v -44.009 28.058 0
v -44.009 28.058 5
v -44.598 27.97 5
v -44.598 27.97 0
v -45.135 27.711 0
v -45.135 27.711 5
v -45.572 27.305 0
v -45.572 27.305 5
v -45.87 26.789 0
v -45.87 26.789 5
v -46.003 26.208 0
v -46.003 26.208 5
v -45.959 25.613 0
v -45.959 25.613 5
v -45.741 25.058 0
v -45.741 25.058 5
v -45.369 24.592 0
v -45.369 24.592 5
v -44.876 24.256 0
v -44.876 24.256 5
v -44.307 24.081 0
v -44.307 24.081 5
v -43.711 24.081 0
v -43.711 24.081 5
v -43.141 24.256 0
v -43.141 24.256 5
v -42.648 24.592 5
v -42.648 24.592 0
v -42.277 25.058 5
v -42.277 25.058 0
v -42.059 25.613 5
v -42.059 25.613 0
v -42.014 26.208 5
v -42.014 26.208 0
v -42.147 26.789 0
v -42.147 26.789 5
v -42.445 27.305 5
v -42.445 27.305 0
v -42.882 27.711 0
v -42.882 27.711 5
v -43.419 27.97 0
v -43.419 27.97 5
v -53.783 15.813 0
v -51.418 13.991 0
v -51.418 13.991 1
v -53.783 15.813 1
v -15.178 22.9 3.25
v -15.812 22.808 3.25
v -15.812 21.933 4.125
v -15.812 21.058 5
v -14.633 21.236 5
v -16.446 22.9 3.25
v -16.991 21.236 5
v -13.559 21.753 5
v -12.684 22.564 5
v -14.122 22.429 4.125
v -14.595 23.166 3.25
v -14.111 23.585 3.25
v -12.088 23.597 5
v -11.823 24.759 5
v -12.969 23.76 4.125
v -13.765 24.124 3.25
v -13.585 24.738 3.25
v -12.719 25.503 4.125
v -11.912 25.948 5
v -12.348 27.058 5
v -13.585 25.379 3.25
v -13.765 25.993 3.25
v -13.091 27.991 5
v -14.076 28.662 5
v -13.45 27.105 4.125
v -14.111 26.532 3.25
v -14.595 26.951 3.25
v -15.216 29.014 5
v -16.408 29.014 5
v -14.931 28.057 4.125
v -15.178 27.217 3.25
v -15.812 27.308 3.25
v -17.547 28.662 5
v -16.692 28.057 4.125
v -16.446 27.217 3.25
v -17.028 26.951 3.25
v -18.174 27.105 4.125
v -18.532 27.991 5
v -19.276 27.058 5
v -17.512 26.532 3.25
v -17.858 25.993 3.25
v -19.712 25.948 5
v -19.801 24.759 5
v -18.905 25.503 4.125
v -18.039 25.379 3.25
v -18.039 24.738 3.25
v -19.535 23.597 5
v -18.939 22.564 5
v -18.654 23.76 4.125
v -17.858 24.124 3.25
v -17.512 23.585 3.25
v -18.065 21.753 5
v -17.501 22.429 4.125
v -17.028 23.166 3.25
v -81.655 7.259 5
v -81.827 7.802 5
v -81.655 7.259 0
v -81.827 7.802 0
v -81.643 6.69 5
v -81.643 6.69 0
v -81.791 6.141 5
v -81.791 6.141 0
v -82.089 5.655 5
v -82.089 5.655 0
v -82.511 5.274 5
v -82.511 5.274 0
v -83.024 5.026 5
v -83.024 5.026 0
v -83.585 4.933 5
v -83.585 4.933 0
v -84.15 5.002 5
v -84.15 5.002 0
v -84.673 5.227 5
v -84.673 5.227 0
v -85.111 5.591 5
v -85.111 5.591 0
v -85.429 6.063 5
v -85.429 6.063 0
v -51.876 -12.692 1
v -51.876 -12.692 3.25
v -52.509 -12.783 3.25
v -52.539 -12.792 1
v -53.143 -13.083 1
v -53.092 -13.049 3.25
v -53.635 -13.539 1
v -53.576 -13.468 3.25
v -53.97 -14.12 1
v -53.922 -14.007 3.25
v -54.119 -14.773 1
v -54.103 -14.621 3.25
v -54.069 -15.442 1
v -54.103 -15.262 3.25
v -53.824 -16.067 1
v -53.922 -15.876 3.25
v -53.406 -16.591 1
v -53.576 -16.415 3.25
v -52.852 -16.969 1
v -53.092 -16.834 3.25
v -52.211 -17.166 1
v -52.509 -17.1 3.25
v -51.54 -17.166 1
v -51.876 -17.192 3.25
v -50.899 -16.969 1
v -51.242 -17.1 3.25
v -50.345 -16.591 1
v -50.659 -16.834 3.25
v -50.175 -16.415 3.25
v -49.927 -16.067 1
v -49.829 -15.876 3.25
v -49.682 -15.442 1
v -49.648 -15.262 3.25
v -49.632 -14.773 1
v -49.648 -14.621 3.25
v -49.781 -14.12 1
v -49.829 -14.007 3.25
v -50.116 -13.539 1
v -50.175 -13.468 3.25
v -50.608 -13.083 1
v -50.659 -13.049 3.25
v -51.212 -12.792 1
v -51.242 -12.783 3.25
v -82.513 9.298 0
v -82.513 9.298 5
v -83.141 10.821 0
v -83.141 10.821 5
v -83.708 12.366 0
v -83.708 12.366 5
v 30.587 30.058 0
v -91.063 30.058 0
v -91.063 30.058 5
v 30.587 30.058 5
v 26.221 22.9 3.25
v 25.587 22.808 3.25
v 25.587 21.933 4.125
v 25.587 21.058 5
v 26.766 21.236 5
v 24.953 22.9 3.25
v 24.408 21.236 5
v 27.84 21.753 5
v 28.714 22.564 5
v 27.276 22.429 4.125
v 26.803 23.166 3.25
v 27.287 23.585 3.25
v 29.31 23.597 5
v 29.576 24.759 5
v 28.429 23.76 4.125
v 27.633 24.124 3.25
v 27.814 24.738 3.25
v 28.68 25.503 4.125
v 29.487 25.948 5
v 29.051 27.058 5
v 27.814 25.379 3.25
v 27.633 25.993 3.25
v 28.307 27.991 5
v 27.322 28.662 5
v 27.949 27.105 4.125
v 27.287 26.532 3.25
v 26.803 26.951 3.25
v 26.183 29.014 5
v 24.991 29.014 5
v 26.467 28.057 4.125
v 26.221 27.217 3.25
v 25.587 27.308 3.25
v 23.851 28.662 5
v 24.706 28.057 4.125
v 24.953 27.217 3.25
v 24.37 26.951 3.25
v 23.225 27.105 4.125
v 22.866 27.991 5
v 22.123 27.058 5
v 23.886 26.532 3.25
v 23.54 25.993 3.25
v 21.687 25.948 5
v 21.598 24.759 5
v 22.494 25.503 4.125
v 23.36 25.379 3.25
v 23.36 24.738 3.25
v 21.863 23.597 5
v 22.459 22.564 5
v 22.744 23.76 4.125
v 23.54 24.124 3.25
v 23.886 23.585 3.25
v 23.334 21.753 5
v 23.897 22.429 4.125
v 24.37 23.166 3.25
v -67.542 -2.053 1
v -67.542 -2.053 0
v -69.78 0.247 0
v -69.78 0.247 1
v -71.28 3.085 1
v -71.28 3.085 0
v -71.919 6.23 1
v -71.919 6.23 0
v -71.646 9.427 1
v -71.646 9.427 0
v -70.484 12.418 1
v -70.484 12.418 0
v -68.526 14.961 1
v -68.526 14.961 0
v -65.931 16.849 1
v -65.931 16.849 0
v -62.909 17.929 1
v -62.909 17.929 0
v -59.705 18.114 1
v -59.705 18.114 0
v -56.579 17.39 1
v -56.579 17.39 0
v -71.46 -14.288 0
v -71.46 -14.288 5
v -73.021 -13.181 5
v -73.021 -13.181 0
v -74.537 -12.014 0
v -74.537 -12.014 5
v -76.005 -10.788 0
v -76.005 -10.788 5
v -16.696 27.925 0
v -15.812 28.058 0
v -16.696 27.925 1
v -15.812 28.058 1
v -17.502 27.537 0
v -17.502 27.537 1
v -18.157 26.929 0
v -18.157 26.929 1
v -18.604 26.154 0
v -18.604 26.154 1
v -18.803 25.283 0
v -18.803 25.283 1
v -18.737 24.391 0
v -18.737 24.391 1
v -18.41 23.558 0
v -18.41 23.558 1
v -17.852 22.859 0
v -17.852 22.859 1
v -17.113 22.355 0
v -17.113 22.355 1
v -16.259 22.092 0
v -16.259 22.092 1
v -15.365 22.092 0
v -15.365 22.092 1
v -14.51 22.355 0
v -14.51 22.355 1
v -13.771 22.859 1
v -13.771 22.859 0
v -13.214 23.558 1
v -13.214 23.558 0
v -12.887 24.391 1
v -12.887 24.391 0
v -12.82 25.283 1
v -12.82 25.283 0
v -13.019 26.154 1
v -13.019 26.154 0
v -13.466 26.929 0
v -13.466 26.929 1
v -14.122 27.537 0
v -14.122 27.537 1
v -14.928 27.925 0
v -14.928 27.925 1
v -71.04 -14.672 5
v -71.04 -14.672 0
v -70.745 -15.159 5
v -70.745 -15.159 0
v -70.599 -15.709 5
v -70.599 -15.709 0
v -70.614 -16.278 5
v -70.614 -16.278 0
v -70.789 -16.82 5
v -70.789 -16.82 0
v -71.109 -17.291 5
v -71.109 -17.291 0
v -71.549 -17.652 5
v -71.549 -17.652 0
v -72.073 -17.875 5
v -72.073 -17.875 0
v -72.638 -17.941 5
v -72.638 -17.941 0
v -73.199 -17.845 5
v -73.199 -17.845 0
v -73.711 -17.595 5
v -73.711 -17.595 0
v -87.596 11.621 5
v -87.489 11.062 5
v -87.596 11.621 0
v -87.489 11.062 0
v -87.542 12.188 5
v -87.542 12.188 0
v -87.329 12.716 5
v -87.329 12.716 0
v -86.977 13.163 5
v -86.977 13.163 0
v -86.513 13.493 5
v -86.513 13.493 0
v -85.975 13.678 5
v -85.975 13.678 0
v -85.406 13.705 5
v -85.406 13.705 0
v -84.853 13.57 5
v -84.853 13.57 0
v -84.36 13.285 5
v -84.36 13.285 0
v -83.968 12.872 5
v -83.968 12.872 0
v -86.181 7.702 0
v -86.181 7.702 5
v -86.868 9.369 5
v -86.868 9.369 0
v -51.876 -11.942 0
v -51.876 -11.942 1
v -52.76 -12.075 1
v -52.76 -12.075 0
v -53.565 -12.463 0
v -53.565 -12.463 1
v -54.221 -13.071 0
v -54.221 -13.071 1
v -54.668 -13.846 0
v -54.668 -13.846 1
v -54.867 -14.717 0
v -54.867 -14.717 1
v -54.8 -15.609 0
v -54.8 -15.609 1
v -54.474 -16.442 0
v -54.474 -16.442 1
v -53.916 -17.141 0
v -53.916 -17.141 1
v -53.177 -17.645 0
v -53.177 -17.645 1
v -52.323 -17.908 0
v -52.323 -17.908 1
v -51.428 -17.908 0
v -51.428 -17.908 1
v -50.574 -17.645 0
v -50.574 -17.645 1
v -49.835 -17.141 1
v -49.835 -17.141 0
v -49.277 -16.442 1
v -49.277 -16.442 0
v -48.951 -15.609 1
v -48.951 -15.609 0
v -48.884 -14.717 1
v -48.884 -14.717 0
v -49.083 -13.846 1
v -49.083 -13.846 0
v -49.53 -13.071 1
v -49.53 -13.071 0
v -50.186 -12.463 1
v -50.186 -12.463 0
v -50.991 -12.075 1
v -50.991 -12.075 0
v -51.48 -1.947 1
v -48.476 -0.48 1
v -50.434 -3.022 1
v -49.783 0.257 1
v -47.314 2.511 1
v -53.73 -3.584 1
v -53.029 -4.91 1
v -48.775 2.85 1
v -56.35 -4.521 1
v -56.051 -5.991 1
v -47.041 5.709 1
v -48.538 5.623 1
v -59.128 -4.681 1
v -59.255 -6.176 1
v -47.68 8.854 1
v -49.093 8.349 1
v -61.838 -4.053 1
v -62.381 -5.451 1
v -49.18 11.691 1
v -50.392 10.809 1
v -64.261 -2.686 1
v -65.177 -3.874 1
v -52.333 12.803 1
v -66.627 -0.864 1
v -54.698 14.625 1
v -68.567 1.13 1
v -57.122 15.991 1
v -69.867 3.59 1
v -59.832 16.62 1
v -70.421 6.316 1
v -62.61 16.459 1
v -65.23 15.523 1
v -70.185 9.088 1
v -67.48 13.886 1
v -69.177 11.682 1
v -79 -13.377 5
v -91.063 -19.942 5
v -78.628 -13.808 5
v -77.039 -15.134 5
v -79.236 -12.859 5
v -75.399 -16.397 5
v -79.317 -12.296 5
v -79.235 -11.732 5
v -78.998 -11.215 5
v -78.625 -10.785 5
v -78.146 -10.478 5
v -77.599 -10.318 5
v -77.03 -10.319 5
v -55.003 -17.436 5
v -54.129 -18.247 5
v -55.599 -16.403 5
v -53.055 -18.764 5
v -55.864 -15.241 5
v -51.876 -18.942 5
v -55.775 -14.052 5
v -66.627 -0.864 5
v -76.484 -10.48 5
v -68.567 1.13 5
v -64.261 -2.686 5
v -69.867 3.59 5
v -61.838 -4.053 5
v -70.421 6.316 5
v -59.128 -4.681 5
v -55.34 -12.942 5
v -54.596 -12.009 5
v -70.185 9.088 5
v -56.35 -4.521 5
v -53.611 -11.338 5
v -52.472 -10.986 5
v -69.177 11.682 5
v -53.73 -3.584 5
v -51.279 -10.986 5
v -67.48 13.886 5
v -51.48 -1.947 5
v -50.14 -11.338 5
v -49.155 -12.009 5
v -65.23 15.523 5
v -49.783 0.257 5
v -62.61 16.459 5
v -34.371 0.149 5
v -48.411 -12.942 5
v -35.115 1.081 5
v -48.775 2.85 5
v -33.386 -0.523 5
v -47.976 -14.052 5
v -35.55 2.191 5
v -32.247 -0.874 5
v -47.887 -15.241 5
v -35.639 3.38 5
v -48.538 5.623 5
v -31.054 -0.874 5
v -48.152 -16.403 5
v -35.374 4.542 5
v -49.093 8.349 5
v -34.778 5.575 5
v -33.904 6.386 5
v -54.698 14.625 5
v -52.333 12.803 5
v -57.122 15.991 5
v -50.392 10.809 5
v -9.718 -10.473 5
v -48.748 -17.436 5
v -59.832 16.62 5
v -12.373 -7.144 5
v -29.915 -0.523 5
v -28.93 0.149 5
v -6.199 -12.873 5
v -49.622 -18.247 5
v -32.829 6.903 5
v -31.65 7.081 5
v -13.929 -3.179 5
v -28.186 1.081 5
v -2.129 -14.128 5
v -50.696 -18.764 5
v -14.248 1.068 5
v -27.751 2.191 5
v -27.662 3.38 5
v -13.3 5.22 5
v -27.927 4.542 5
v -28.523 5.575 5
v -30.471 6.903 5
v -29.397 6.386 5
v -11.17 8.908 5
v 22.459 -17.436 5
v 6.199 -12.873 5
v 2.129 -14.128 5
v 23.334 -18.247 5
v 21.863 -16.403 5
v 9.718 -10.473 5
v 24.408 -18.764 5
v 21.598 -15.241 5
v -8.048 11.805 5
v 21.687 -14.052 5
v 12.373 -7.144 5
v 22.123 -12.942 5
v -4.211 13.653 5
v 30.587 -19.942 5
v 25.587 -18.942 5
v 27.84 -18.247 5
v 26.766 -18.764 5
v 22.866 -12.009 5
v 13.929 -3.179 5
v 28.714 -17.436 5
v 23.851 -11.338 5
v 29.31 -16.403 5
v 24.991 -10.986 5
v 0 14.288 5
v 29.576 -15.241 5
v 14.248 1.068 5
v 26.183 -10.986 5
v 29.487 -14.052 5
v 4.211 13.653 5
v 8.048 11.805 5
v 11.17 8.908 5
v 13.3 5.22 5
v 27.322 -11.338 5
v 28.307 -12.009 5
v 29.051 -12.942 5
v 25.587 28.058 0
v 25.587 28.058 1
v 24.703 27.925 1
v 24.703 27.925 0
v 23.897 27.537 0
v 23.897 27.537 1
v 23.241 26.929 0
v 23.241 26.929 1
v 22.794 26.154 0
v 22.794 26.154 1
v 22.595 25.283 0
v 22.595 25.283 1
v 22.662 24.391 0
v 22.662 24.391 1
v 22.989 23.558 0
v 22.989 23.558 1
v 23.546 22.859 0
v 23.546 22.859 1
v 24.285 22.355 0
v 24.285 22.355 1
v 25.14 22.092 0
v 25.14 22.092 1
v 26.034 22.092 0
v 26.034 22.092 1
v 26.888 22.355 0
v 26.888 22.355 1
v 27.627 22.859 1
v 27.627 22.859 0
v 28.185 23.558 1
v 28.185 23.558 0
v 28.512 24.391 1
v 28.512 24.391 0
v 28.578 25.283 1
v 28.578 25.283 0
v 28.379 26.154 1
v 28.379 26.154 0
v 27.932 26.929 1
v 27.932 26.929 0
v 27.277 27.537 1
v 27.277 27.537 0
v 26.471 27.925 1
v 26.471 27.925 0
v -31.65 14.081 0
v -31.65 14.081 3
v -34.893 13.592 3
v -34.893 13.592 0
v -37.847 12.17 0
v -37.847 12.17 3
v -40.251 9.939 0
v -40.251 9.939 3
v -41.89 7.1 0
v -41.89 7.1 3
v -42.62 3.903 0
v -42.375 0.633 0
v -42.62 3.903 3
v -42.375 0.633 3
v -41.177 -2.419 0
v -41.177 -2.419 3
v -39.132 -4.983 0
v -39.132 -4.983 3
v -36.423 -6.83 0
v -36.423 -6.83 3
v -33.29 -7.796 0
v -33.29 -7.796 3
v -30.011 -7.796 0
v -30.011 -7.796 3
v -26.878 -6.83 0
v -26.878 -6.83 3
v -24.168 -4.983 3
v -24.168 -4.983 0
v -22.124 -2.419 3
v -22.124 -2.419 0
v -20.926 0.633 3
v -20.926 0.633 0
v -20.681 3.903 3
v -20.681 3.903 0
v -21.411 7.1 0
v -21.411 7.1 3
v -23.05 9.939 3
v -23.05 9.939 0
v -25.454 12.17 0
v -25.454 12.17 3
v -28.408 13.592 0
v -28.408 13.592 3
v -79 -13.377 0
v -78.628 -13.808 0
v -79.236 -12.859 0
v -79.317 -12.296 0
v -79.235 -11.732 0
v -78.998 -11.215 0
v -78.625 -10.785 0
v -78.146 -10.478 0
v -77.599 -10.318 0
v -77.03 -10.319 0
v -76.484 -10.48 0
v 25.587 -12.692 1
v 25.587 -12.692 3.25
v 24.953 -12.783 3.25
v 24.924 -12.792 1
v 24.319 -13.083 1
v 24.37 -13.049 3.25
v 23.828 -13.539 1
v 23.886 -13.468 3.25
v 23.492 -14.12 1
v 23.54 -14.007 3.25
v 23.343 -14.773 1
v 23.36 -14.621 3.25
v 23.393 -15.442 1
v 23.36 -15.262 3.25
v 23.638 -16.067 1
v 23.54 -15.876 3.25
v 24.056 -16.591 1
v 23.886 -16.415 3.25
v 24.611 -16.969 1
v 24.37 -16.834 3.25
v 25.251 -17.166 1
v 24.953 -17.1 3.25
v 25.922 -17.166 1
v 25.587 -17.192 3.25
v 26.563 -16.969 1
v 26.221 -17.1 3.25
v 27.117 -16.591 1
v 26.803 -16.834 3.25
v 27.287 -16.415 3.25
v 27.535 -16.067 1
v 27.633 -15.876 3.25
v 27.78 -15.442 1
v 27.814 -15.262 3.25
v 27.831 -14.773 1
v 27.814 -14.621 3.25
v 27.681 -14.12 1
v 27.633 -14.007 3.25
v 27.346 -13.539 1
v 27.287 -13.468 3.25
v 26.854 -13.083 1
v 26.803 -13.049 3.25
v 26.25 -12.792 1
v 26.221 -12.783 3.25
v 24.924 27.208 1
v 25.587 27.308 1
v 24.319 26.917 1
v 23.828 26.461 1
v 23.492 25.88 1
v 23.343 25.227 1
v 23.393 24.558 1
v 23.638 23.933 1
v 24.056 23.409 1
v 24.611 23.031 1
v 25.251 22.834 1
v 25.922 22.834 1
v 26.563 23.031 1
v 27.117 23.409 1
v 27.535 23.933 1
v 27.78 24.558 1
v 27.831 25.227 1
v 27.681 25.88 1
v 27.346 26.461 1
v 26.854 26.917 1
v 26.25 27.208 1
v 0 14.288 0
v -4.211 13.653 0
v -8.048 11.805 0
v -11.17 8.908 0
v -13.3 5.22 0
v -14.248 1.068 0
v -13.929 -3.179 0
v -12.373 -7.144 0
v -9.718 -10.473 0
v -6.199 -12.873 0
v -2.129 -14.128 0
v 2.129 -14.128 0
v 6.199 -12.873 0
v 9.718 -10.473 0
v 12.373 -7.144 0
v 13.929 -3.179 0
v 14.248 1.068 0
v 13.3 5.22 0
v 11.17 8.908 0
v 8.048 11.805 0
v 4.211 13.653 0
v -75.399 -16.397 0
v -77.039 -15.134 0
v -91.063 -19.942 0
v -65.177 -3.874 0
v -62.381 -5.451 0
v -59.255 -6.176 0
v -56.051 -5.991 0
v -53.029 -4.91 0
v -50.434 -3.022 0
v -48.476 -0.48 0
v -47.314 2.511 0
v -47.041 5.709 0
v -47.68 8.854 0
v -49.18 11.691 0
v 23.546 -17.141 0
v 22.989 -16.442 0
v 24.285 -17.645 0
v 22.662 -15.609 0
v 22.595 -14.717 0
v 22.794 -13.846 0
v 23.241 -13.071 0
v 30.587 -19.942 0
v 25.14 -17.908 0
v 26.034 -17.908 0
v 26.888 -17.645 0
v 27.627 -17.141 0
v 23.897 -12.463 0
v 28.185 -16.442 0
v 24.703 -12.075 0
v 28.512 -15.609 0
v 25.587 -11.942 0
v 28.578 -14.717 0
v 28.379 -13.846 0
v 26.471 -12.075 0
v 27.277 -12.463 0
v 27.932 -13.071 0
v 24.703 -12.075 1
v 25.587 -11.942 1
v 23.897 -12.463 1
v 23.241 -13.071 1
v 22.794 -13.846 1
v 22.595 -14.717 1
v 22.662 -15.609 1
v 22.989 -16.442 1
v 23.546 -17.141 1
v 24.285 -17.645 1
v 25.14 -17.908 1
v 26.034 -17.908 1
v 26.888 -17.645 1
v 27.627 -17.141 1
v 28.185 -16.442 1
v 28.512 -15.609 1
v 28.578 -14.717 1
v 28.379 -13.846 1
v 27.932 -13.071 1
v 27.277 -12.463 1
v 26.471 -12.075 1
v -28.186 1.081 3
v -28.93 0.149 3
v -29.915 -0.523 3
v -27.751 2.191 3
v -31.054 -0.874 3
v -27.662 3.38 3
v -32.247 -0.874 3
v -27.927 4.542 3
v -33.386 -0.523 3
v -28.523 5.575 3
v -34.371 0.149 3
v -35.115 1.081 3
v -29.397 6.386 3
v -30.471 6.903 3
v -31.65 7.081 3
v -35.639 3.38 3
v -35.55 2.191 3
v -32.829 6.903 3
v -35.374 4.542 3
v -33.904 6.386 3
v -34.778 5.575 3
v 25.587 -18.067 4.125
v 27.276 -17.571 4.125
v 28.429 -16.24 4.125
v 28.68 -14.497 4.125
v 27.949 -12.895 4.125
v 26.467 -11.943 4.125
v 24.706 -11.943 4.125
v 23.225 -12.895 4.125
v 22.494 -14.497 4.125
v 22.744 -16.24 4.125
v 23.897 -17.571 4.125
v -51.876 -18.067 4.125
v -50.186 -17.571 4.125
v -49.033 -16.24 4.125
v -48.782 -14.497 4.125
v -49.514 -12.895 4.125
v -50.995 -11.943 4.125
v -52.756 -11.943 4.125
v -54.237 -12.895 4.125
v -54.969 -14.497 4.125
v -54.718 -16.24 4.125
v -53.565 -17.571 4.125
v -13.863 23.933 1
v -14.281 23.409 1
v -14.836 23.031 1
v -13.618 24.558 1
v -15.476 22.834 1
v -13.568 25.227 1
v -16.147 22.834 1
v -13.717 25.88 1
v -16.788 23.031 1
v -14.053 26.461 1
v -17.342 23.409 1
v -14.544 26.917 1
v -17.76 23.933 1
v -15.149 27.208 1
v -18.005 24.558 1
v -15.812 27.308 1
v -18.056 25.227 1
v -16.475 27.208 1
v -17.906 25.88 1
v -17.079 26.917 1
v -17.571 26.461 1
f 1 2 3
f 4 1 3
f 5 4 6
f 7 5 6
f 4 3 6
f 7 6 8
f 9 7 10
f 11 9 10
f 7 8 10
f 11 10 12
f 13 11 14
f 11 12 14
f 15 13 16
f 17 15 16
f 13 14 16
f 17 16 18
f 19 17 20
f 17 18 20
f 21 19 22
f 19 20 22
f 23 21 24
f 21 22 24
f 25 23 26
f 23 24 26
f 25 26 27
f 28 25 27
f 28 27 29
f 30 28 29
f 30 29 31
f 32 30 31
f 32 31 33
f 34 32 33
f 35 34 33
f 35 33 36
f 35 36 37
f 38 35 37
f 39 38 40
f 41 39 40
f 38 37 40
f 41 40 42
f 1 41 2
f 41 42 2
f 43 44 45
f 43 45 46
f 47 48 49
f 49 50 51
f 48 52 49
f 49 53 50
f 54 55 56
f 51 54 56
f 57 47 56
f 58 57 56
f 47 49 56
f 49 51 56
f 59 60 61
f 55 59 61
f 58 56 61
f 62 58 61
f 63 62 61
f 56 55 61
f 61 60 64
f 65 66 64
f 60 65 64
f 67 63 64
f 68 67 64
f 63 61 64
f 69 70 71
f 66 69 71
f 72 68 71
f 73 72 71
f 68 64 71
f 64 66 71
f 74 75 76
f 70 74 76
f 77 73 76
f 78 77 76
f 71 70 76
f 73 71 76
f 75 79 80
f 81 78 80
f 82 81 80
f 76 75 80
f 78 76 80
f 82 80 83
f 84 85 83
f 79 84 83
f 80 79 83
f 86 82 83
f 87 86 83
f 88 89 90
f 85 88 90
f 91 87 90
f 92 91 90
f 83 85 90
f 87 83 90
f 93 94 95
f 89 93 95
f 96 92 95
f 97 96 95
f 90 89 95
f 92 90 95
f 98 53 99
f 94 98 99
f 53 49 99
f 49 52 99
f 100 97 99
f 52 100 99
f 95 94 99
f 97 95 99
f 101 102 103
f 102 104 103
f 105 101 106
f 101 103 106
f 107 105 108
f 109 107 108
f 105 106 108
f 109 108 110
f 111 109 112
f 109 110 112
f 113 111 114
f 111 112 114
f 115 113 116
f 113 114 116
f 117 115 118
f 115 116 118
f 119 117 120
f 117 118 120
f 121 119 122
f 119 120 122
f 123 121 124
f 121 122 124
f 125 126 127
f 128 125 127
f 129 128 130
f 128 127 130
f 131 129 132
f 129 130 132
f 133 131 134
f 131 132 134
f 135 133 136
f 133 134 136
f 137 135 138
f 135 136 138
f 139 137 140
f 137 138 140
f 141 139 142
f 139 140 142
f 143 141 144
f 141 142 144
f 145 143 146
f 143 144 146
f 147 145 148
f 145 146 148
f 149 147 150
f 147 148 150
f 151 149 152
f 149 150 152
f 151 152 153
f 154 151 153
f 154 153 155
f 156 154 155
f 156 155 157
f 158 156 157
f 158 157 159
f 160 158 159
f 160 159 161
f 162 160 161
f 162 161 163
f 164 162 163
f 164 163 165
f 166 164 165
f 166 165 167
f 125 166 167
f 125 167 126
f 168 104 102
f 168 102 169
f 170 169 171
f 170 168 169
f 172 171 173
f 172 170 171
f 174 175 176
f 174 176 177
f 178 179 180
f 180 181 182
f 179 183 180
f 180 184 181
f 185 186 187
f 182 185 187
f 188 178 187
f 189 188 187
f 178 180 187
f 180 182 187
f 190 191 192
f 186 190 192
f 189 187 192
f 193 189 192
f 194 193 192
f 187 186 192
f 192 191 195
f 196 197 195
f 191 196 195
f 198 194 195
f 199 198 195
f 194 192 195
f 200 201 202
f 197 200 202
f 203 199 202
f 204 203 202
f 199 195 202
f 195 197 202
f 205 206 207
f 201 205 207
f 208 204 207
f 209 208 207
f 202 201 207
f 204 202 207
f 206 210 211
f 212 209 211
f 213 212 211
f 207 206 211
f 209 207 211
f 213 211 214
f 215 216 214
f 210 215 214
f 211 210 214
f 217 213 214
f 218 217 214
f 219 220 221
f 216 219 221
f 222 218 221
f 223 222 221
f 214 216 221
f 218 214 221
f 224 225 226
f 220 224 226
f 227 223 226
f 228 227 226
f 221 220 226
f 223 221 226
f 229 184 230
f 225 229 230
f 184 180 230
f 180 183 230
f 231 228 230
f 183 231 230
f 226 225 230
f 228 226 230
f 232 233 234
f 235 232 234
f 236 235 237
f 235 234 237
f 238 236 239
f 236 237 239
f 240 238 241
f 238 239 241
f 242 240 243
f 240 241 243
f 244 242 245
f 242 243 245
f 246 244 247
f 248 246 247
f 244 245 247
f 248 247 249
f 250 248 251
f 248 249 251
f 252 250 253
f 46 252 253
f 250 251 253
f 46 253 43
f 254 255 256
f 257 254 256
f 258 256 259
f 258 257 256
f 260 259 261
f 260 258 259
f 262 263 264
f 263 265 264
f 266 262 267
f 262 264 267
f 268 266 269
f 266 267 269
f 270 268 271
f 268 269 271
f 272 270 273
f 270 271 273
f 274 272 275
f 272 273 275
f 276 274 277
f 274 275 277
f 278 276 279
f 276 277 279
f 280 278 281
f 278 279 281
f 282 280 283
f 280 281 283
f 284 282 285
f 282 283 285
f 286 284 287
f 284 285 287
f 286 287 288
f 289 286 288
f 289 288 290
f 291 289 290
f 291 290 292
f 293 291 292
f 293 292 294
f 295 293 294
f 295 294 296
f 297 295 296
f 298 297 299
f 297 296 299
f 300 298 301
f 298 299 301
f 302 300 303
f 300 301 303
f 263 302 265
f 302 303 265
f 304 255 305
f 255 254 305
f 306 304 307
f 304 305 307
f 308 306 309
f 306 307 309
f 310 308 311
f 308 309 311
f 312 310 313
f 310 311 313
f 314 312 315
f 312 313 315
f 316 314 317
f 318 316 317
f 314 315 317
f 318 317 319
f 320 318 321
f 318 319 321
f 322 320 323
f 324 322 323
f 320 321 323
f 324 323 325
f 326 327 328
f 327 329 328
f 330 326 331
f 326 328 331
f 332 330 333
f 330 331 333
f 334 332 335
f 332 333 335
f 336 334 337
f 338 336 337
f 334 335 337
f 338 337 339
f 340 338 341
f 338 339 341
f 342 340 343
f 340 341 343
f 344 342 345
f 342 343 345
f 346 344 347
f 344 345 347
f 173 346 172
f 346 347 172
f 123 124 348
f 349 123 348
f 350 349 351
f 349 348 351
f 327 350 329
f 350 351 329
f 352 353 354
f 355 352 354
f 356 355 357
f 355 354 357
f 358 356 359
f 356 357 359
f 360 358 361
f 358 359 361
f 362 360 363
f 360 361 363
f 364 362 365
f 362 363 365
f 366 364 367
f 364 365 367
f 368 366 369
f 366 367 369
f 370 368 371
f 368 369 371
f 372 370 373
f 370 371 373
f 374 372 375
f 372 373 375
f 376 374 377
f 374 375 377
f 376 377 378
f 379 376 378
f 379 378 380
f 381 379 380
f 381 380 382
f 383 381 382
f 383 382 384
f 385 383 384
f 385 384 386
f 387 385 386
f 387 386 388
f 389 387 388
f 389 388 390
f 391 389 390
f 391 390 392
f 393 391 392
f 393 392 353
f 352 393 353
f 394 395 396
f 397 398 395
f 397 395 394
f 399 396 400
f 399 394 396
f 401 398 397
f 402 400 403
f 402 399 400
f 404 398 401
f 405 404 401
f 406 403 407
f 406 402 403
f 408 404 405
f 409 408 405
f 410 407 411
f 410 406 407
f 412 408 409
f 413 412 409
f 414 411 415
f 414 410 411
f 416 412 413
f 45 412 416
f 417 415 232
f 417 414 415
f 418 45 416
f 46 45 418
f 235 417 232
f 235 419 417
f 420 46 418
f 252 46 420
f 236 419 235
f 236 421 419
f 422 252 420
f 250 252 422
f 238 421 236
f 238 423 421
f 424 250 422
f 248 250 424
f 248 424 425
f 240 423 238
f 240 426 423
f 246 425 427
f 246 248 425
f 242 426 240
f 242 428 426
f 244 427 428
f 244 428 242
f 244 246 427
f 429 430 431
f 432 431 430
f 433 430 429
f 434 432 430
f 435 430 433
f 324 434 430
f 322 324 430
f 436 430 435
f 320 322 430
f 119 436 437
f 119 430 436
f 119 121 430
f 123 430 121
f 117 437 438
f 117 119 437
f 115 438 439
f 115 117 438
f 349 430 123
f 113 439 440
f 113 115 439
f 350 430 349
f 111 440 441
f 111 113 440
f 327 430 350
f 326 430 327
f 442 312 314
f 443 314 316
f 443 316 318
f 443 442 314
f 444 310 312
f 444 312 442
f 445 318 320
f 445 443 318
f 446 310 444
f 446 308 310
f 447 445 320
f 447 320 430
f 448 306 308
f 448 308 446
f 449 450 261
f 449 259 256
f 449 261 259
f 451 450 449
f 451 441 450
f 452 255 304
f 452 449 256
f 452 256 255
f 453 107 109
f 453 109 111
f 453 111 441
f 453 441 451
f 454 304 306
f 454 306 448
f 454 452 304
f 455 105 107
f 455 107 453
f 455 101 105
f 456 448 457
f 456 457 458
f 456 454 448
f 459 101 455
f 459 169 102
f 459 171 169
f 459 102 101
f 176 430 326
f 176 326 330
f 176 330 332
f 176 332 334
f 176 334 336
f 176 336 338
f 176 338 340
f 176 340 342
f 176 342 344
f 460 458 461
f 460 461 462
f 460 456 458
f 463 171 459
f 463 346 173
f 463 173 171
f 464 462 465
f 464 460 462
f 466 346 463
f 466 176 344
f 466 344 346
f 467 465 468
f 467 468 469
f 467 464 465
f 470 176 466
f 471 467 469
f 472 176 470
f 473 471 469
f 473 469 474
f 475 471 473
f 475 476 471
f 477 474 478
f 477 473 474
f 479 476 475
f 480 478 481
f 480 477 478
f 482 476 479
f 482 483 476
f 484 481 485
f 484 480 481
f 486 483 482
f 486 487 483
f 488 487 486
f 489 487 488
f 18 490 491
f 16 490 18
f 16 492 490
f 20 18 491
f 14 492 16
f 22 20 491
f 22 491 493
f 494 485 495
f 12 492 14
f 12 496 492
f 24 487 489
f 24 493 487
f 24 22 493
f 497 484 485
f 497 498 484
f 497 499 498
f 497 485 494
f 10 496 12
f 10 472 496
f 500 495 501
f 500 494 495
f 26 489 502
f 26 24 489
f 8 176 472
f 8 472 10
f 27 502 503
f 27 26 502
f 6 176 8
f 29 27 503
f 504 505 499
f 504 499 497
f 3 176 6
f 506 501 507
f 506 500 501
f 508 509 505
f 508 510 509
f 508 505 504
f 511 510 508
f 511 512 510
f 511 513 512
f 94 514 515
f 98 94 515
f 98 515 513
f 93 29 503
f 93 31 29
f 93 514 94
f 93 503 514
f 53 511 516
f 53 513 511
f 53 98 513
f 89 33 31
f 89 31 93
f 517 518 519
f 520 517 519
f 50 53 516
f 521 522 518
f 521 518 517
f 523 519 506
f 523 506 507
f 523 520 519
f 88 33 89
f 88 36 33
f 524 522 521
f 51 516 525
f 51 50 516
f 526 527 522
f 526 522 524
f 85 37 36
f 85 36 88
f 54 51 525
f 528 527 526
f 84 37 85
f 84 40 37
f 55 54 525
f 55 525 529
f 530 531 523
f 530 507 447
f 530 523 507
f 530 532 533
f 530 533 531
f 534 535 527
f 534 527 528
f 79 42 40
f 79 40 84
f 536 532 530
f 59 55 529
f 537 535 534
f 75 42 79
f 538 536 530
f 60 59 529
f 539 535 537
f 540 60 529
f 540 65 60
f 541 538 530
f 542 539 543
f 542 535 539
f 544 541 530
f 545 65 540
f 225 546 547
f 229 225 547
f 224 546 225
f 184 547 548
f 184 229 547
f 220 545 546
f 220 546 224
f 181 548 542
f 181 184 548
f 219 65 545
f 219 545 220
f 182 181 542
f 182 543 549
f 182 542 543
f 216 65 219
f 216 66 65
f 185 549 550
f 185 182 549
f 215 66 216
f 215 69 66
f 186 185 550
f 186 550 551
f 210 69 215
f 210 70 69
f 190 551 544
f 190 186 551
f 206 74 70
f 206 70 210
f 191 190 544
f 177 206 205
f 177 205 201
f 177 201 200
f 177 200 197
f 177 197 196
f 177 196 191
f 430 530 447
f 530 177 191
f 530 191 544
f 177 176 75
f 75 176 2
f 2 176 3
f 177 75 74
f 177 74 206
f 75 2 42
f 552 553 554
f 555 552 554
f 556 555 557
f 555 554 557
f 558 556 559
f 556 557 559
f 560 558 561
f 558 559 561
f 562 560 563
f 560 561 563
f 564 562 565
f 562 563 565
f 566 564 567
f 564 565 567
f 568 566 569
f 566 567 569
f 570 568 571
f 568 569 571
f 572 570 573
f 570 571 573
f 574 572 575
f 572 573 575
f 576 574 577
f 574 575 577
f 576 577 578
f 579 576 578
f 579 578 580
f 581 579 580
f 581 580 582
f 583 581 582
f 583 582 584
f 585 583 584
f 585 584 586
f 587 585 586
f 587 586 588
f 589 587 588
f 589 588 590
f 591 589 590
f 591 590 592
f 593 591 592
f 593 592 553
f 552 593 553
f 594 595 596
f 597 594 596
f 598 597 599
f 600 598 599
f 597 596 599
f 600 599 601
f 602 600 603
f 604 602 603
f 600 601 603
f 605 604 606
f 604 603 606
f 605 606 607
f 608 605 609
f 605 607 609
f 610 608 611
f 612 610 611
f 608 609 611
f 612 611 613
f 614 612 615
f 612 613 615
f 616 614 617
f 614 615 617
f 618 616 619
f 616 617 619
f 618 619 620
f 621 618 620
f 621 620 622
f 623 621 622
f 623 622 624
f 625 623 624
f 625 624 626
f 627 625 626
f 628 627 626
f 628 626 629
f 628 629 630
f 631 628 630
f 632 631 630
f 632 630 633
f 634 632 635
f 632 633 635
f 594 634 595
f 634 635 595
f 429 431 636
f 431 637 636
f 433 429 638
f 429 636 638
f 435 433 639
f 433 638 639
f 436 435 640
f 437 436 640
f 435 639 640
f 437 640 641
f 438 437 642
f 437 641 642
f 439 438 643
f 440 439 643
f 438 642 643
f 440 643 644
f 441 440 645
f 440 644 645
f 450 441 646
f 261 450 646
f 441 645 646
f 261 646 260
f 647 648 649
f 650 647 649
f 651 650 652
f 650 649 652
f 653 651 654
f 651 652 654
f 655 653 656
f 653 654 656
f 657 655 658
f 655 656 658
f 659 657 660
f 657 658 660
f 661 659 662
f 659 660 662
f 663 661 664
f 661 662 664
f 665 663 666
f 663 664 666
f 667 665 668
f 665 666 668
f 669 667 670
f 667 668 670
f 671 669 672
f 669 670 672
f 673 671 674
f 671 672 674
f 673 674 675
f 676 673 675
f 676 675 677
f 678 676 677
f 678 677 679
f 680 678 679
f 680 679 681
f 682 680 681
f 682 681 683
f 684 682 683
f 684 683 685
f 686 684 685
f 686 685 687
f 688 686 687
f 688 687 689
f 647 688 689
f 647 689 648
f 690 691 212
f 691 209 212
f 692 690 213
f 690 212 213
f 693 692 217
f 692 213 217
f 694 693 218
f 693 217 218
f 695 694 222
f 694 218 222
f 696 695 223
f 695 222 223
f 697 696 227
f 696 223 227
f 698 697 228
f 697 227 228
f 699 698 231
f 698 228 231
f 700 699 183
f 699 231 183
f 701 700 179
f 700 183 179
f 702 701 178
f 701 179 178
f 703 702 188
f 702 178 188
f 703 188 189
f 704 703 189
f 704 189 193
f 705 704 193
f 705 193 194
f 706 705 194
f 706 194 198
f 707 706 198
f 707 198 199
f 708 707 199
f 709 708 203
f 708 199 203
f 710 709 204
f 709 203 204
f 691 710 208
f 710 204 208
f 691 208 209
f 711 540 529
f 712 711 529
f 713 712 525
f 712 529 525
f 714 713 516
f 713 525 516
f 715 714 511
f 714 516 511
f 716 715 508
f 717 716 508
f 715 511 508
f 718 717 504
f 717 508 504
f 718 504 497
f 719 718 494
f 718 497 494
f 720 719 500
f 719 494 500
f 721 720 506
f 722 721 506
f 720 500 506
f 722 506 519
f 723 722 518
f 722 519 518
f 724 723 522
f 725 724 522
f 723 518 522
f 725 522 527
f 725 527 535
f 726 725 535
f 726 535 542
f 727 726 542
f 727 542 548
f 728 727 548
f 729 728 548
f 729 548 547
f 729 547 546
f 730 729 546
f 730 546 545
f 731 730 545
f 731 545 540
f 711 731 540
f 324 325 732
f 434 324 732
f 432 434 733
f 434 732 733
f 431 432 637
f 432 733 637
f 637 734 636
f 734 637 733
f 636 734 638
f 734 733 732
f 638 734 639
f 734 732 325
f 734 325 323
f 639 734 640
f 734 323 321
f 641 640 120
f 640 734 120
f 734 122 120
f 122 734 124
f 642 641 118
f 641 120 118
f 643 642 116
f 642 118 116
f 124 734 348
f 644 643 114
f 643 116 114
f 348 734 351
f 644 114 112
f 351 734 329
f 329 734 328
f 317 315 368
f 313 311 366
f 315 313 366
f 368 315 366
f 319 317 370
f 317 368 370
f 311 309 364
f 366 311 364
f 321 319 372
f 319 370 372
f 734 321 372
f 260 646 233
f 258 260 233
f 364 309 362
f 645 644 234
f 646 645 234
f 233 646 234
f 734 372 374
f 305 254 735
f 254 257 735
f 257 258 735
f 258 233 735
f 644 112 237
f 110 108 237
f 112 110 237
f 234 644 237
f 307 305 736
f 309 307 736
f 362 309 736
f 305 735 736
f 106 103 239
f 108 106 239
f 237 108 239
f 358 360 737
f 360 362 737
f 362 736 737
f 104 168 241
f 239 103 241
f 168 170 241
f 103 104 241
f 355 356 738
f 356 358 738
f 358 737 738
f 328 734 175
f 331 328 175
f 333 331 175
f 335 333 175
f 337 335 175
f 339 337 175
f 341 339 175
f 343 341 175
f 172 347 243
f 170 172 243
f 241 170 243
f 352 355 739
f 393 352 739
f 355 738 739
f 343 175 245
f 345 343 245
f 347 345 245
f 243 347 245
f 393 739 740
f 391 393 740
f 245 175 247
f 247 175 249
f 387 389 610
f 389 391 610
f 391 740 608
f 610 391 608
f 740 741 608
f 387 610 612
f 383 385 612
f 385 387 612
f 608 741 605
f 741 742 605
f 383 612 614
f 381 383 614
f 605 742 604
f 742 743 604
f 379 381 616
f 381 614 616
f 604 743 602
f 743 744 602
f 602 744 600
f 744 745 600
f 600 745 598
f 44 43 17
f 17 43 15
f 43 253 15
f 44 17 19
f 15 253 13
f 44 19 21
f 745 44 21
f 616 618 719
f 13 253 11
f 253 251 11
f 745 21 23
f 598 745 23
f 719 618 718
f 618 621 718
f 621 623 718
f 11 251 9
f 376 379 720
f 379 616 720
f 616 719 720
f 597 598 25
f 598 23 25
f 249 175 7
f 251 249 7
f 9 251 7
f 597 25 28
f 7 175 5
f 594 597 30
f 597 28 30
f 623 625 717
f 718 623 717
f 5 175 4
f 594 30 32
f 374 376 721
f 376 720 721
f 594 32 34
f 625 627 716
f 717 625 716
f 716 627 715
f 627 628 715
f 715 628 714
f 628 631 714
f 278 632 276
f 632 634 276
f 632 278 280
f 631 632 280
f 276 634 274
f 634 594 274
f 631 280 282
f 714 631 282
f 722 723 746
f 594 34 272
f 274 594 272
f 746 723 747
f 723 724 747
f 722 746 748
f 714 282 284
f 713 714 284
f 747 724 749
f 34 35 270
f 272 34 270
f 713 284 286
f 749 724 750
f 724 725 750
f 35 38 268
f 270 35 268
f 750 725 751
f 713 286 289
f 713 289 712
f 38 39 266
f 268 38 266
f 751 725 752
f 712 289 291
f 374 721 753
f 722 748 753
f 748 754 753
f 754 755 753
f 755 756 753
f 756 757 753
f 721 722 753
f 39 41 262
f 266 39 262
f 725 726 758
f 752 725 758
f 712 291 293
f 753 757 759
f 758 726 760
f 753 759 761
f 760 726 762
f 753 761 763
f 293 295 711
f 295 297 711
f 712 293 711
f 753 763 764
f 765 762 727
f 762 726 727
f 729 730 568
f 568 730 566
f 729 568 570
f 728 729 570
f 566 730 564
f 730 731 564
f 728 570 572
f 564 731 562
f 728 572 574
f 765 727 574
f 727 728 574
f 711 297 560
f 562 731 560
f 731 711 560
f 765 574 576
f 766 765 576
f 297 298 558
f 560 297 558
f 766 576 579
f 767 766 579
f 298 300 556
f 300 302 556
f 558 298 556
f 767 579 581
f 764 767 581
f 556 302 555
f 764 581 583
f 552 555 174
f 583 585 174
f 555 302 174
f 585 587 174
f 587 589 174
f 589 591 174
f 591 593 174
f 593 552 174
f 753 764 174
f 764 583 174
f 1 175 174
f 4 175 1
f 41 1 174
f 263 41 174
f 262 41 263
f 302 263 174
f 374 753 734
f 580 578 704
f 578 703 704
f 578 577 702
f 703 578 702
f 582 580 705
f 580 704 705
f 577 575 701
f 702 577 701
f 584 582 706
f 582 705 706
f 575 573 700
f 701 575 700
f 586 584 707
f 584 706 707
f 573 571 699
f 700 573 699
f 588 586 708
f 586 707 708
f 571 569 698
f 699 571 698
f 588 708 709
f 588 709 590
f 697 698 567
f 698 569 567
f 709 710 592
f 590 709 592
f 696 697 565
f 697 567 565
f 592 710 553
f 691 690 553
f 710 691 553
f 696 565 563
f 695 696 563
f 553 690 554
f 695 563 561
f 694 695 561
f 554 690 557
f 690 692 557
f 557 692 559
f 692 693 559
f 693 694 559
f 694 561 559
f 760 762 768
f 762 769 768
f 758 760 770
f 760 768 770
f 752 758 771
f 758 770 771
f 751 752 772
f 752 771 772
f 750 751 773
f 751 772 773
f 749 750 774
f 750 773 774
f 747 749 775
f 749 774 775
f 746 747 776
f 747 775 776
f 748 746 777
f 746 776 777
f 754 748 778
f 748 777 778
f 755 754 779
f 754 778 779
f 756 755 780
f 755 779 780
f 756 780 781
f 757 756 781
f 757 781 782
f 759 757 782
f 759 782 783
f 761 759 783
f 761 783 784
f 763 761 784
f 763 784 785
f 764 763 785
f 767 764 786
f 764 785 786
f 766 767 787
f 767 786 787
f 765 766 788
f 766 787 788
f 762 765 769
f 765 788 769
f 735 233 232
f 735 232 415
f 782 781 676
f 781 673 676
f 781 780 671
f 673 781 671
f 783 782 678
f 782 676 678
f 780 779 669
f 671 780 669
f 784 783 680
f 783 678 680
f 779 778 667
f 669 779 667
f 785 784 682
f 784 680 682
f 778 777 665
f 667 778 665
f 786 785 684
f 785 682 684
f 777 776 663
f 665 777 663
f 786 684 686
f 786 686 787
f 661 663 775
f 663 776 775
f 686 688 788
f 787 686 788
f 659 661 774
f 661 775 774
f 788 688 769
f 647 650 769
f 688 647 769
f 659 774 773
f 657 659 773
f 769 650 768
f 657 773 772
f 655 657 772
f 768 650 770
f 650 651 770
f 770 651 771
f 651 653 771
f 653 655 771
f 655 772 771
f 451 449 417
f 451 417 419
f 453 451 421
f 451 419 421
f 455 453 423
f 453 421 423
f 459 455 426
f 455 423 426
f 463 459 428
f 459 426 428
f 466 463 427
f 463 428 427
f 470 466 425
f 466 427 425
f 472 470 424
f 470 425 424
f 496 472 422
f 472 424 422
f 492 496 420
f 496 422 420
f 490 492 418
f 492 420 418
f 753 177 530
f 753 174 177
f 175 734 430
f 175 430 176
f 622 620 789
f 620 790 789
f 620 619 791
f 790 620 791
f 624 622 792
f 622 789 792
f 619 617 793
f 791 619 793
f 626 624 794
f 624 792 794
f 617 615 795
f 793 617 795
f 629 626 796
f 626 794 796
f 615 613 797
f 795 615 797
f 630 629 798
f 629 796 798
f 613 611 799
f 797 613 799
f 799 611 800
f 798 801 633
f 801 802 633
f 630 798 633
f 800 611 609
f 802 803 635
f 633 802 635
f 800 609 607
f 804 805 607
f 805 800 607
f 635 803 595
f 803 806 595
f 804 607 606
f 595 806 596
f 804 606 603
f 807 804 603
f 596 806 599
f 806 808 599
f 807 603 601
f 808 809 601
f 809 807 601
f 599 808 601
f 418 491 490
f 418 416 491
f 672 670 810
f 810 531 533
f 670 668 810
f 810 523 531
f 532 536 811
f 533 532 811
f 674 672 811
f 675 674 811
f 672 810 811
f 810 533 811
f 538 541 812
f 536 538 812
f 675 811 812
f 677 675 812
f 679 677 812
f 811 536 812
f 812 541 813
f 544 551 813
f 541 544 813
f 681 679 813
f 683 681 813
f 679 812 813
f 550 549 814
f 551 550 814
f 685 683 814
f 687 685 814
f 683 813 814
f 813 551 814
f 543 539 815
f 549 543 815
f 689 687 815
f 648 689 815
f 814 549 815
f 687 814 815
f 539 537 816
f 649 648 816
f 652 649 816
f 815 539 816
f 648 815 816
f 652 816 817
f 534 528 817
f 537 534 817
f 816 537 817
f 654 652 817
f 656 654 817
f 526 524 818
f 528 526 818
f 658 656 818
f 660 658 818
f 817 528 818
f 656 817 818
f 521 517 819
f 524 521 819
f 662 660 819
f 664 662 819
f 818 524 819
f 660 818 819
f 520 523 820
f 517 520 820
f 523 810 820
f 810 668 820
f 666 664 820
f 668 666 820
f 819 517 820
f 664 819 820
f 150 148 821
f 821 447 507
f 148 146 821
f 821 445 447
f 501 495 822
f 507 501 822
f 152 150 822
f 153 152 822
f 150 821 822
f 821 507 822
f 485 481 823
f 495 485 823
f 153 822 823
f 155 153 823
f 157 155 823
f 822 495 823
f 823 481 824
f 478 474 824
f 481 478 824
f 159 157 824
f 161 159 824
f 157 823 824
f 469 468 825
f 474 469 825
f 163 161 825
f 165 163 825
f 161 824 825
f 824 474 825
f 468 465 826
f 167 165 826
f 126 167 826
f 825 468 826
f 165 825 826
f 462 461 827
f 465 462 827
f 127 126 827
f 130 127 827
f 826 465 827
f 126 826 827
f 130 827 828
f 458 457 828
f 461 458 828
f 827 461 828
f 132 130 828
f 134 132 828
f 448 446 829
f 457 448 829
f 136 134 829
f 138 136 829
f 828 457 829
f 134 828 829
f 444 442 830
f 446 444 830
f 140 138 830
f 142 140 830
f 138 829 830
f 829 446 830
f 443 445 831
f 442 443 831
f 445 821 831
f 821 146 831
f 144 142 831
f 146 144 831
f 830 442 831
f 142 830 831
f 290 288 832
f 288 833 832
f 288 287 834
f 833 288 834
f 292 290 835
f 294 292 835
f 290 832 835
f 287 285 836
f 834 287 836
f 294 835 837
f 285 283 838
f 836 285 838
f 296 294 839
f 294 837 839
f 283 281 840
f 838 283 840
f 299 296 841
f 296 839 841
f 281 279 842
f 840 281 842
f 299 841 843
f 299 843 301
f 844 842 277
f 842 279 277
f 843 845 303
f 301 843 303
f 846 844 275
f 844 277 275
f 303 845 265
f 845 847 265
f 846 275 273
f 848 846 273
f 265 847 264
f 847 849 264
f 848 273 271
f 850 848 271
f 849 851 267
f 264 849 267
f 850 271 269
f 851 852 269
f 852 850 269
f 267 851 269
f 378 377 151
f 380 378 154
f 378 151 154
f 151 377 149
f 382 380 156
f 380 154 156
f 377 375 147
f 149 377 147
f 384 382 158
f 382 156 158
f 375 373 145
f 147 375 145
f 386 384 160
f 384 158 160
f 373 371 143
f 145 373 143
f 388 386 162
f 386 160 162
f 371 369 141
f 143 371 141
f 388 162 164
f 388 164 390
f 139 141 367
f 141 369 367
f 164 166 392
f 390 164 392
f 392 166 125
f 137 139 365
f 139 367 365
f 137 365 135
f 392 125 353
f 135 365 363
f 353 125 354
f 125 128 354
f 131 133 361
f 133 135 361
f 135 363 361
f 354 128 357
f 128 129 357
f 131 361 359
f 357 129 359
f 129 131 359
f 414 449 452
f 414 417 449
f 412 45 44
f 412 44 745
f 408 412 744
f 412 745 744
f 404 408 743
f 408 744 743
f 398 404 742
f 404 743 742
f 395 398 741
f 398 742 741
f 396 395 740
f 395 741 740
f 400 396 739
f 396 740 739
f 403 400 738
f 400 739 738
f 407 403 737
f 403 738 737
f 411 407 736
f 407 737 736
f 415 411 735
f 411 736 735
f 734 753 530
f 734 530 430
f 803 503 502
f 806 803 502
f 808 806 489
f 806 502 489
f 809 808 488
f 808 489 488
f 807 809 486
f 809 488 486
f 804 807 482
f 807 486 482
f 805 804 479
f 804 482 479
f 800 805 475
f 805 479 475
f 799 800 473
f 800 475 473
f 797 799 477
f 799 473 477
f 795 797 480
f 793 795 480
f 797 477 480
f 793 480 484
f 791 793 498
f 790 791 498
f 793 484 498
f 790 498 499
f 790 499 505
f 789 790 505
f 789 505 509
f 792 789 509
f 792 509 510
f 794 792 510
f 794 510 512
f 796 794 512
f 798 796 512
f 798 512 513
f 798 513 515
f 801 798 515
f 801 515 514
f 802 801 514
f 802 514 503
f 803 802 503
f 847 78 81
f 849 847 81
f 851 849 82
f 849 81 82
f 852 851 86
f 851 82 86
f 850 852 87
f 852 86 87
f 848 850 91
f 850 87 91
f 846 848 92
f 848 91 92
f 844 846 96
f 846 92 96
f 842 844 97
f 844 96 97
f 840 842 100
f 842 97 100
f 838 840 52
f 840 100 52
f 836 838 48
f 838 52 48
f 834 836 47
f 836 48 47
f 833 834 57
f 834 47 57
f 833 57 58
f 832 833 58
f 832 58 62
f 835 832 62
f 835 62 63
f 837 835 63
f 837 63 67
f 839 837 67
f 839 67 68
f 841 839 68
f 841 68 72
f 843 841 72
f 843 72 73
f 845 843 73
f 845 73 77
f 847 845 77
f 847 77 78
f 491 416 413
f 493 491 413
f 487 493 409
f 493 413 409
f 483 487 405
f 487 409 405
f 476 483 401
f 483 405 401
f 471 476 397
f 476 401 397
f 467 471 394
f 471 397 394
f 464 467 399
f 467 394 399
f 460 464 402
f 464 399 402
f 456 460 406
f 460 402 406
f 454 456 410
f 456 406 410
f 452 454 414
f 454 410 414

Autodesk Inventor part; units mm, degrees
ref_plane "YZ Plane" through (0, 0, 0) normal (1, 0, 0) x (0, 1, 0)
ref_plane "XZ Plane" through (0, 0, 0) normal (0, 1, 0) x (-1, 0, 0)
ref_plane "XY Plane" through (0, 0, 0) normal (0, 0, 1) x (1, 0, 0)
sketch "MASTER SKETCH" plane through (0, 0, 0) normal (0, 0, 1) x (1, 0, 0)
  circle A0 centre (0, 0) radius 22.86
  circle A1 centre (-31.6504, 3.081) radius 8.89
  circle A2 centre (-31.6504, 3.081) radius 20.32
  circle A3 centre (-60.6627, 6.8802) radius 8.89
  circle A4 centre (-58.2971, 5.0584) radius 6.35
  circle A5 centre (-60.6627, 6.8802) radius 25.4
  circle A6 centre (-58.2971, 5.0584) radius 25.4 construction
  line L0 (-44.0087, 26.0584) -> (-77.3167, -12.298) construction
  line L1 (-68.9445, 30.8921) -> (-52.3809, -17.1317) construction
  circle A7 centre (-44.0087, 26.0584) radius 2
  arc A8 (-68.9445, 30.8921) -> (-69.3394, 27.9326) centre (-44.0087, 26.0584) ccw construction
  arc A9 (-70.9079, 31.2727) -> (-71.334, 28.0802) centre (-44.0087, 26.0584) ccw
  arc A10 (-66.981, 30.5115) -> (-67.3449, 27.785) centre (-44.0087, 26.0584) ccw
  arc A11 (-66.981, 30.5115) -> (-70.9079, 31.2727) centre (-68.9445, 30.8921) ccw
  arc A12 (-71.334, 28.0802) -> (-67.3449, 27.785) centre (-69.3394, 27.9326) ccw
  arc A13 (-85.5985, 11.7139) -> (-83.6279, 6.9326) centre (-44.0087, 26.0584) ccw construction
  arc A14 (-87.4892, 11.0618) -> (-85.429, 6.0631) centre (-44.0087, 26.0584) ccw
  arc A15 (-83.7078, 12.366) -> (-81.8268, 7.8021) centre (-44.0087, 26.0584) ccw
  arc A16 (-83.7078, 12.366) -> (-87.4892, 11.0618) centre (-85.5985, 11.7139) ccw
  arc A17 (-85.429, 6.0631) -> (-81.8268, 7.8021) centre (-83.6279, 6.9326) ccw
  arc A18 (-77.3167, -12.298) -> (-72.5856, -15.9416) centre (-44.0087, 26.0584) ccw construction
  arc A19 (-78.6281, -13.8081) -> (-73.7107, -17.5951) centre (-44.0087, 26.0584) ccw
  arc A20 (-76.0054, -10.7879) -> (-71.4605, -14.288) centre (-44.0087, 26.0584) ccw
  arc A21 (-76.0054, -10.7879) -> (-78.6281, -13.8081) centre (-77.3167, -12.298) ccw
  arc A22 (-73.7107, -17.5951) -> (-71.4605, -14.288) centre (-72.5856, -15.9416) ccw
  arc A23 (-52.3809, -17.1317) -> (-47.2548, -17.8157) centre (-44.0087, 26.0584) ccw construction
  arc A24 (-52.7615, -19.0951) -> (-47.4024, -19.8103) centre (-44.0087, 26.0584) ccw
  arc A25 (-52.0003, -15.1682) -> (-47.1072, -15.8212) centre (-44.0087, 26.0584) ccw
  arc A26 (-52.0003, -15.1682) -> (-52.7615, -19.0951) centre (-52.3809, -17.1317) ccw
  arc A27 (-47.4024, -19.8103) -> (-47.1072, -15.8212) centre (-47.2548, -17.8157) ccw
  arc A28 (-35.7269, 2.0465) -> (-32.9664, 3.1843) centre (-44.0087, 26.0584) ccw construction
  arc A29 (-35.0748, 0.1558) -> (-32.0969, 1.3831) centre (-44.0087, 26.0584) ccw
  arc A30 (-36.379, 3.9372) -> (-33.8358, 4.9854) centre (-44.0087, 26.0584) ccw
  arc A31 (-36.379, 3.9372) -> (-35.0748, 0.1558) centre (-35.7269, 2.0465) ccw
  arc A32 (-32.0969, 1.3831) -> (-33.8358, 4.9854) centre (-32.9664, 3.1843) ccw
  line L2 (-91.0627, 30.0584) -> (30.5868, 30.0584)
  line L3 (30.5868, 30.0584) -> (30.5868, -19.9416)
  line L4 (30.5868, -19.9416) -> (-91.0627, -19.9416)
  line L5 (-91.0627, -19.9416) -> (-91.0627, 30.0584)
  circle A33 centre (0, 0) radius 14.2875 construction
  circle A34 centre (25.5868, -14.9416) radius 3
  circle A35 centre (25.5868, 25.0584) radius 3
  circle A36 centre (-51.8755, -14.9416) radius 3
  line L6 (-91.0627, 25.3566) -> (30.5868, 25.3566) construction
  circle A37 centre (-15.8118, 25.0584) radius 3
  line L7 (-58.2971, 5.0584) -> (-60.6627, 6.8802) construction
  line L8 (-52.3328, 12.803) -> (-54.6984, 14.6248)
  line L9 (-66.627, -0.8643) -> (-64.2614, -2.6861)
  arc A38 (-64.2614, -2.6861) -> (-52.3328, 12.803) centre (-58.2971, 5.0584) ccw
  arc A39 (-54.6984, 14.6248) -> (-66.627, -0.8643) centre (-60.6627, 6.8802) ccw
  circle A40 centre (0, 0) radius 24.13 construction
  circle A41 centre (-31.6504, 3.081) radius 21.59 construction
  line L10 (-67.5422, -2.0527) -> (-65.1767, -3.8745)
  arc A42 (-65.1767, -3.8745) -> (-51.4176, 13.9914) centre (-58.2971, 5.0584) ccw
  line L11 (-51.4176, 13.9914) -> (-53.7832, 15.8132)
  arc A43 (-53.7832, 15.8132) -> (-67.5422, -2.0527) centre (-60.6627, 6.8802) ccw
  circle A44 centre (-44.0087, 26.0584) radius 50.8 construction
  arc A45 (-67.3815, -0.857) -> (-64.0616, -3.4137) centre (-44.0087, 26.0584) ccw
  arc A46 (-53.9439, 14.6174) -> (-52.5326, 13.5306) centre (-44.0087, 26.0584) ccw
  arc A47 (-53.9439, 14.6174) -> (-67.3815, -0.857) centre (-60.6627, 6.8802) ccw
  arc A48 (-64.0616, -3.4137) -> (-52.5326, 13.5306) centre (-58.2971, 5.0584) ccw
  line L12 (-35.7269, 2.0465) -> (-85.5985, 11.7139) construction
  point P0 (-60.0285, -7.7006)
  point P1 (-59.4799, 5.9693)
  dimension "d0" = 45.72
  dimension "d1" = 17.78
  dimension "d2" = 40.64
  dimension "d4" = 17.78
  dimension "d5" = 12.7
  dimension "d6" = 50.8
  dimension "d9" = 50.8
  dimension "d10" = 60
  dimension "d12" = 4
  dimension "d13" = 4
  dimension "d14" = 4
  dimension "d15" = 4
  dimension "d16" = 4
  dimension "d17" = 4
  dimension "d19" = 28.575
  dimension "d28" = 6
  dimension "d29" = 6
  dimension "d30" = 6
  dimension "d39" = 31.8
  dimension "d42" = 29.26
  dimension "d43" = 26.72
  dimension "d70" = 2
  dimension "d73" = 6
  dimension "d84" = 2
  dimension "d85" = 5
  dimension "d89" = 19.55
  dimension "d108" = 1.27
  dimension "d109" = 1.27
  dimension "d110" = 2.5
  dimension "d111" = 2.5
  dimension "d113" = 2.5
  dimension "d114" = 2
  dimension "d129" = 1.5
  dimension "d133" = 2.5
  dimension "d136" = 50
  dimension "d139" = 2
  dimension "d140" = 2.5
  dimension "d141" = 2
  dimension "d142" = 2
  dimension "d181" = 60
sketch "Sketch2" plane through (0, 0, 0) normal (0, 0, 1) x (1, 0, 0)
  line L0 (-91.0627, 30.0584) -> (30.5868, 30.0584) projected
  line L1 (-91.0627, -19.9416) -> (-91.0627, 30.0584) projected
  line L2 (30.5868, 30.0584) -> (30.5868, -19.9416) projected
  line L3 (30.5868, -19.9416) -> (-91.0627, -19.9416) projected
  line L4 (-91.0627, 30.0584) -> (30.5868, 30.0584)
  line L5 (30.5868, 30.0584) -> (30.5868, -19.9416)
  line L6 (30.5868, -19.9416) -> (-91.0627, -19.9416)
  line L7 (-91.0627, -19.9416) -> (-91.0627, 30.0584)
  point P0 (0, 0)
extrude "Extrusion1" add sketch "Sketch2" along normal blind 5
sketch "Sketch3" plane through (0, 0, 0) normal (0, 0, -1) x (-1, 0, 0)
  arc A0 (47.1072, -15.8212) -> (47.4024, -19.8103) centre (47.2548, -17.8157) ccw projected
  arc A1 (47.1072, -15.8212) -> (52.0003, -15.1682) centre (44.0087, 26.0584) ccw projected
  arc A2 (47.4024, -19.8103) -> (52.7615, -19.0951) centre (44.0087, 26.0584) ccw projected
  arc A3 (52.7615, -19.0951) -> (52.0003, -15.1682) centre (52.3809, -17.1317) ccw projected
  line L0 (91.0627, 30.0584) -> (91.0627, -19.9416) projected
  line L1 (-30.5868, 30.0584) -> (91.0627, 30.0584) projected
  line L2 (-30.5868, -19.9416) -> (-30.5868, 30.0584) projected
  line L3 (91.0627, -19.9416) -> (-30.5868, -19.9416) projected
  arc A4 (71.4605, -14.288) -> (73.7107, -17.5951) centre (72.5856, -15.9416) ccw projected
  arc A5 (73.7107, -17.5951) -> (78.6281, -13.8081) centre (44.0087, 26.0584) ccw projected
  arc A6 (71.4605, -14.288) -> (76.0054, -10.7879) centre (44.0087, 26.0584) ccw projected
  arc A7 (78.6281, -13.8081) -> (76.0054, -10.7879) centre (77.3167, -12.298) ccw projected
  arc A8 (81.8268, 7.8021) -> (83.7078, 12.366) centre (44.0087, 26.0584) ccw projected
  arc A9 (81.8268, 7.8021) -> (85.429, 6.0631) centre (83.6279, 6.9326) ccw projected
  arc A10 (85.429, 6.0631) -> (87.4892, 11.0618) centre (44.0087, 26.0584) ccw projected
  arc A11 (87.4892, 11.0618) -> (83.7078, 12.366) centre (85.5985, 11.7139) ccw projected
  arc A12 (71.334, 28.0802) -> (70.9079, 31.2727) centre (44.0087, 26.0584) ccw projected
  arc A13 (67.3449, 27.785) -> (66.981, 30.5115) centre (44.0087, 26.0584) ccw projected
  arc A14 (70.9079, 31.2727) -> (66.981, 30.5115) centre (68.9445, 30.8921) ccw projected
  arc A15 (67.3449, 27.785) -> (71.334, 28.0802) centre (69.3394, 27.9326) ccw projected
  arc A16 (66.627, -0.8643) -> (54.6984, 14.6248) centre (60.6627, 6.8802) ccw projected
  arc A17 (52.3328, 12.803) -> (64.2614, -2.6861) centre (58.2971, 5.0584) ccw projected
  line L4 (52.3328, 12.803) -> (54.6984, 14.6248) projected
  line L5 (66.627, -0.8643) -> (64.2614, -2.6861) projected
  point P0 (0, 0)
extrude "Extrusion2" cut sketch "Sketch3" against normal blind 5 contours A6 A7 A5 A4 | A8 A11 A10 A9 | L5 A17 L4 A16
sketch "Sketch4" plane through (0, 0, 0) normal (0, 0, -1) x (-1, 0, 0)
  circle A0 centre (-25.5868, 25.0584) radius 3 projected
  circle A1 centre (15.8118, 25.0584) radius 3 projected
  circle A2 centre (51.8755, -14.9416) radius 3 projected
  circle A3 centre (-25.5868, -14.9416) radius 3 projected
  point P0 (0, 0)
sketch "Sketch5" plane through (0, 0, 0) normal (0, 0, -1) x (-1, 0, 0)
  circle A0 centre (0, 0) radius 22.86 projected
hole "Hole1" at (0, 0, 0) direction (0, 0, 1) diameter 28.575 end through all
hole "Hole2" at (25.5868, 25.0584, 0) at (-15.8118, 25.0584, 0) at (25.5868, -14.9416, 0) at (-51.8755, -14.9416, 0) direction (0, 0, 1) diameter 4.5 end through all counterbore diameter 6 counterbore depth 1
sketch "Sketch6" plane through (0, 0, 0) normal (0, 0, -1) x (-1, 0, 0)
  line L0 (91.0627, 25.3566) -> (-30.5868, 25.3566) construction
  circle A0 centre (44.0087, 26.0584) radius 2 projected
  point P0 (0, 0)
hole "Hole3" at (-44.0087, 26.0584, 0) direction (0, 0, 1) diameter 4 end through all
sketch "Sketch7" plane through (0, 0, 0) normal (0, 0, -1) x (-1, 0, 0)
  circle A0 centre (31.6504, 3.081) radius 20.32 projected
  point P0 (0, 0)
hole "Hole4" at (-31.6504, 3.081, 0) direction (0, 0, 1) diameter 8 depth 5 counterbore diameter 22 counterbore depth 3
sketch "Sketch8" plane through (0, 0, 0) normal (0, 0, -1) x (-1, 0, 0)
  arc A0 (52.3328, 12.803) -> (64.2614, -2.6861) centre (58.2971, 5.0584) ccw projected
  line L0 (66.627, -0.8643) -> (64.2614, -2.6861) projected
  arc A1 (66.627, -0.8643) -> (54.6984, 14.6248) centre (60.6627, 6.8802) ccw projected
  line L1 (52.3328, 12.803) -> (54.6984, 14.6248) projected
  arc A2 (67.5422, -2.0527) -> (53.7832, 15.8132) centre (60.6627, 6.8802) ccw projected
  line L2 (51.4176, 13.9914) -> (53.7832, 15.8132) projected
  line L3 (67.5422, -2.0527) -> (65.1767, -3.8745) projected
  arc A3 (51.4176, 13.9914) -> (65.1767, -3.8745) centre (58.2971, 5.0584) ccw projected
  point P0 (0, 0)
extrude "Extrusion3" cut sketch "Sketch8" against normal blind 1 contours L1 A1 L0 A0 | L3 A3 L2 A2
sketch "Sketch11" plane through (0, 0, 0) normal (0, 0, 1) x (1, 0, 0)
  line L0 (30.5868, -19.9416) -> (30.5868, 30.0584) projected
  line L1 (30.5868, 30.0584) -> (30.5868, -19.9416)
  line L2 (30.5868, -19.9416) -> (-61.3292, -19.9416)
  line L3 (-91.0627, -19.9416) -> (30.5868, -19.9416) projected
  line L4 (-61.3292, -19.9416) -> (-32.4617, 30.0584)
  line L5 (30.5868, 30.0584) -> (-91.0627, 30.0584) projected
  line L6 (-32.4617, 30.0584) -> (30.5868, 30.0584)
  circle A0 centre (-44.0087, 26.0584) radius 2 projected
  point P0 (0, 0)
  dimension "d147" = 120
  dimension "d148" = 8
extrude "Extrusion5" [suppressed]
sketch "Sketch12" plane through (0, 0, 0) normal (0, 0, 1) x (1, 0, 0)
  circle A0 centre (-15.8118, 25.0584) radius 3 projected
  circle A1 centre (25.5868, 25.0584) radius 3 projected
  circle A2 centre (25.5868, -14.9416) radius 3 projected
  circle A3 centre (-51.8755, -14.9416) radius 3 projected
  point P0 (0, 0)
hole "Hole5" [suppressed]
sketch "Sketch13" plane through (0, 0, 0) normal (0, 0, 1) x (1, 0, 0)
  circle A0 centre (0, 0) radius 14.2875 construction
hole "Hole6" [suppressed]
sketch "Sketch14" plane through (0, 0, 0) normal (0, 0, 1) x (1, 0, 0)
  circle A0 centre (-31.6504, 3.081) radius 8.89 projected
  point P0 (0, 0)
hole "Hole7" [suppressed]
sketch "Sketch15" plane through (0, 0, 5) normal (0, 0, 1) x (1, 0, 0)
  circle A0 centre (-15.8118, 25.0584) radius 2.25 projected
  circle A1 centre (-51.8755, -14.9416) radius 2.25 projected
  circle A2 centre (25.5868, 25.0584) radius 2.25 projected
  circle A3 centre (25.5868, -14.9416) radius 2.25 projected
  point P0 (0, 0)
hole "Hole8" at (-15.8118, 25.0584, 5) at (-51.8755, -14.9416, 5) at (25.5868, -14.9416, 5) at (25.5868, 25.0584, 5) direction (0, 0, -1) diameter 4 end through all countersink diameter 8 countersink angle 90
sketch "Sketch16" plane through (0, 0, 0) normal (0, 0, -1) x (-1, 0, 0)
  circle A0 centre (44.0087, 26.0584) radius 2 projected
  arc A1 (67.5422, -2.0527) -> (53.7832, 15.8132) centre (60.6627, 6.8802) ccw projected
  line L0 (51.4176, 13.9914) -> (53.7832, 15.8132) projected
  arc A2 (51.4176, 13.9914) -> (65.1767, -3.8745) centre (58.2971, 5.0584) ccw projected
  line L1 (67.5422, -2.0527) -> (65.1767, -3.8745) projected
  arc A3 (71.4605, -14.288) -> (76.0054, -10.7879) centre (44.0087, 26.0584) ccw projected
  arc A4 (78.6281, -13.8081) -> (76.0054, -10.7879) centre (77.3167, -12.298) ccw projected
  arc A5 (73.7107, -17.5951) -> (78.6281, -13.8081) centre (44.0087, 26.0584) ccw projected
  arc A6 (71.4605, -14.288) -> (73.7107, -17.5951) centre (72.5856, -15.9416) ccw projected
  line L2 (58.1824, 5.2073) -> (44.0087, 26.0584)
  point P0 (0, 0)
  dimension "d180" = 2.9858
equation "\"d0\" = SR2PD"
equation "\"d1\" = SR1PD"
equation "\"d2\" = FirstReductionPD"
equation "\"d4\" = Pinion4inPD"
equation "\"d5\" = PinionPD"
equation "\"PinionPD\" = 12.7"
equation "\"FirstReductionPD\" = 40.64"
equation "\"HighGearPD\" = 20.32"
equation "\"LowGearPD\" = 17.78"
equation "\"HighGearDogPD\" = 63.5"
equation "\"LowGearDogPD\" = 76.2"
equation "\"SR1PD\" = 17.78"
equation "\"SR2PD\" = 45.72"
equation "\"Pinion4inPD\" = 17.78"
properties part number "GEARBOX BACKPLATE" material "Aluminum 6061"
